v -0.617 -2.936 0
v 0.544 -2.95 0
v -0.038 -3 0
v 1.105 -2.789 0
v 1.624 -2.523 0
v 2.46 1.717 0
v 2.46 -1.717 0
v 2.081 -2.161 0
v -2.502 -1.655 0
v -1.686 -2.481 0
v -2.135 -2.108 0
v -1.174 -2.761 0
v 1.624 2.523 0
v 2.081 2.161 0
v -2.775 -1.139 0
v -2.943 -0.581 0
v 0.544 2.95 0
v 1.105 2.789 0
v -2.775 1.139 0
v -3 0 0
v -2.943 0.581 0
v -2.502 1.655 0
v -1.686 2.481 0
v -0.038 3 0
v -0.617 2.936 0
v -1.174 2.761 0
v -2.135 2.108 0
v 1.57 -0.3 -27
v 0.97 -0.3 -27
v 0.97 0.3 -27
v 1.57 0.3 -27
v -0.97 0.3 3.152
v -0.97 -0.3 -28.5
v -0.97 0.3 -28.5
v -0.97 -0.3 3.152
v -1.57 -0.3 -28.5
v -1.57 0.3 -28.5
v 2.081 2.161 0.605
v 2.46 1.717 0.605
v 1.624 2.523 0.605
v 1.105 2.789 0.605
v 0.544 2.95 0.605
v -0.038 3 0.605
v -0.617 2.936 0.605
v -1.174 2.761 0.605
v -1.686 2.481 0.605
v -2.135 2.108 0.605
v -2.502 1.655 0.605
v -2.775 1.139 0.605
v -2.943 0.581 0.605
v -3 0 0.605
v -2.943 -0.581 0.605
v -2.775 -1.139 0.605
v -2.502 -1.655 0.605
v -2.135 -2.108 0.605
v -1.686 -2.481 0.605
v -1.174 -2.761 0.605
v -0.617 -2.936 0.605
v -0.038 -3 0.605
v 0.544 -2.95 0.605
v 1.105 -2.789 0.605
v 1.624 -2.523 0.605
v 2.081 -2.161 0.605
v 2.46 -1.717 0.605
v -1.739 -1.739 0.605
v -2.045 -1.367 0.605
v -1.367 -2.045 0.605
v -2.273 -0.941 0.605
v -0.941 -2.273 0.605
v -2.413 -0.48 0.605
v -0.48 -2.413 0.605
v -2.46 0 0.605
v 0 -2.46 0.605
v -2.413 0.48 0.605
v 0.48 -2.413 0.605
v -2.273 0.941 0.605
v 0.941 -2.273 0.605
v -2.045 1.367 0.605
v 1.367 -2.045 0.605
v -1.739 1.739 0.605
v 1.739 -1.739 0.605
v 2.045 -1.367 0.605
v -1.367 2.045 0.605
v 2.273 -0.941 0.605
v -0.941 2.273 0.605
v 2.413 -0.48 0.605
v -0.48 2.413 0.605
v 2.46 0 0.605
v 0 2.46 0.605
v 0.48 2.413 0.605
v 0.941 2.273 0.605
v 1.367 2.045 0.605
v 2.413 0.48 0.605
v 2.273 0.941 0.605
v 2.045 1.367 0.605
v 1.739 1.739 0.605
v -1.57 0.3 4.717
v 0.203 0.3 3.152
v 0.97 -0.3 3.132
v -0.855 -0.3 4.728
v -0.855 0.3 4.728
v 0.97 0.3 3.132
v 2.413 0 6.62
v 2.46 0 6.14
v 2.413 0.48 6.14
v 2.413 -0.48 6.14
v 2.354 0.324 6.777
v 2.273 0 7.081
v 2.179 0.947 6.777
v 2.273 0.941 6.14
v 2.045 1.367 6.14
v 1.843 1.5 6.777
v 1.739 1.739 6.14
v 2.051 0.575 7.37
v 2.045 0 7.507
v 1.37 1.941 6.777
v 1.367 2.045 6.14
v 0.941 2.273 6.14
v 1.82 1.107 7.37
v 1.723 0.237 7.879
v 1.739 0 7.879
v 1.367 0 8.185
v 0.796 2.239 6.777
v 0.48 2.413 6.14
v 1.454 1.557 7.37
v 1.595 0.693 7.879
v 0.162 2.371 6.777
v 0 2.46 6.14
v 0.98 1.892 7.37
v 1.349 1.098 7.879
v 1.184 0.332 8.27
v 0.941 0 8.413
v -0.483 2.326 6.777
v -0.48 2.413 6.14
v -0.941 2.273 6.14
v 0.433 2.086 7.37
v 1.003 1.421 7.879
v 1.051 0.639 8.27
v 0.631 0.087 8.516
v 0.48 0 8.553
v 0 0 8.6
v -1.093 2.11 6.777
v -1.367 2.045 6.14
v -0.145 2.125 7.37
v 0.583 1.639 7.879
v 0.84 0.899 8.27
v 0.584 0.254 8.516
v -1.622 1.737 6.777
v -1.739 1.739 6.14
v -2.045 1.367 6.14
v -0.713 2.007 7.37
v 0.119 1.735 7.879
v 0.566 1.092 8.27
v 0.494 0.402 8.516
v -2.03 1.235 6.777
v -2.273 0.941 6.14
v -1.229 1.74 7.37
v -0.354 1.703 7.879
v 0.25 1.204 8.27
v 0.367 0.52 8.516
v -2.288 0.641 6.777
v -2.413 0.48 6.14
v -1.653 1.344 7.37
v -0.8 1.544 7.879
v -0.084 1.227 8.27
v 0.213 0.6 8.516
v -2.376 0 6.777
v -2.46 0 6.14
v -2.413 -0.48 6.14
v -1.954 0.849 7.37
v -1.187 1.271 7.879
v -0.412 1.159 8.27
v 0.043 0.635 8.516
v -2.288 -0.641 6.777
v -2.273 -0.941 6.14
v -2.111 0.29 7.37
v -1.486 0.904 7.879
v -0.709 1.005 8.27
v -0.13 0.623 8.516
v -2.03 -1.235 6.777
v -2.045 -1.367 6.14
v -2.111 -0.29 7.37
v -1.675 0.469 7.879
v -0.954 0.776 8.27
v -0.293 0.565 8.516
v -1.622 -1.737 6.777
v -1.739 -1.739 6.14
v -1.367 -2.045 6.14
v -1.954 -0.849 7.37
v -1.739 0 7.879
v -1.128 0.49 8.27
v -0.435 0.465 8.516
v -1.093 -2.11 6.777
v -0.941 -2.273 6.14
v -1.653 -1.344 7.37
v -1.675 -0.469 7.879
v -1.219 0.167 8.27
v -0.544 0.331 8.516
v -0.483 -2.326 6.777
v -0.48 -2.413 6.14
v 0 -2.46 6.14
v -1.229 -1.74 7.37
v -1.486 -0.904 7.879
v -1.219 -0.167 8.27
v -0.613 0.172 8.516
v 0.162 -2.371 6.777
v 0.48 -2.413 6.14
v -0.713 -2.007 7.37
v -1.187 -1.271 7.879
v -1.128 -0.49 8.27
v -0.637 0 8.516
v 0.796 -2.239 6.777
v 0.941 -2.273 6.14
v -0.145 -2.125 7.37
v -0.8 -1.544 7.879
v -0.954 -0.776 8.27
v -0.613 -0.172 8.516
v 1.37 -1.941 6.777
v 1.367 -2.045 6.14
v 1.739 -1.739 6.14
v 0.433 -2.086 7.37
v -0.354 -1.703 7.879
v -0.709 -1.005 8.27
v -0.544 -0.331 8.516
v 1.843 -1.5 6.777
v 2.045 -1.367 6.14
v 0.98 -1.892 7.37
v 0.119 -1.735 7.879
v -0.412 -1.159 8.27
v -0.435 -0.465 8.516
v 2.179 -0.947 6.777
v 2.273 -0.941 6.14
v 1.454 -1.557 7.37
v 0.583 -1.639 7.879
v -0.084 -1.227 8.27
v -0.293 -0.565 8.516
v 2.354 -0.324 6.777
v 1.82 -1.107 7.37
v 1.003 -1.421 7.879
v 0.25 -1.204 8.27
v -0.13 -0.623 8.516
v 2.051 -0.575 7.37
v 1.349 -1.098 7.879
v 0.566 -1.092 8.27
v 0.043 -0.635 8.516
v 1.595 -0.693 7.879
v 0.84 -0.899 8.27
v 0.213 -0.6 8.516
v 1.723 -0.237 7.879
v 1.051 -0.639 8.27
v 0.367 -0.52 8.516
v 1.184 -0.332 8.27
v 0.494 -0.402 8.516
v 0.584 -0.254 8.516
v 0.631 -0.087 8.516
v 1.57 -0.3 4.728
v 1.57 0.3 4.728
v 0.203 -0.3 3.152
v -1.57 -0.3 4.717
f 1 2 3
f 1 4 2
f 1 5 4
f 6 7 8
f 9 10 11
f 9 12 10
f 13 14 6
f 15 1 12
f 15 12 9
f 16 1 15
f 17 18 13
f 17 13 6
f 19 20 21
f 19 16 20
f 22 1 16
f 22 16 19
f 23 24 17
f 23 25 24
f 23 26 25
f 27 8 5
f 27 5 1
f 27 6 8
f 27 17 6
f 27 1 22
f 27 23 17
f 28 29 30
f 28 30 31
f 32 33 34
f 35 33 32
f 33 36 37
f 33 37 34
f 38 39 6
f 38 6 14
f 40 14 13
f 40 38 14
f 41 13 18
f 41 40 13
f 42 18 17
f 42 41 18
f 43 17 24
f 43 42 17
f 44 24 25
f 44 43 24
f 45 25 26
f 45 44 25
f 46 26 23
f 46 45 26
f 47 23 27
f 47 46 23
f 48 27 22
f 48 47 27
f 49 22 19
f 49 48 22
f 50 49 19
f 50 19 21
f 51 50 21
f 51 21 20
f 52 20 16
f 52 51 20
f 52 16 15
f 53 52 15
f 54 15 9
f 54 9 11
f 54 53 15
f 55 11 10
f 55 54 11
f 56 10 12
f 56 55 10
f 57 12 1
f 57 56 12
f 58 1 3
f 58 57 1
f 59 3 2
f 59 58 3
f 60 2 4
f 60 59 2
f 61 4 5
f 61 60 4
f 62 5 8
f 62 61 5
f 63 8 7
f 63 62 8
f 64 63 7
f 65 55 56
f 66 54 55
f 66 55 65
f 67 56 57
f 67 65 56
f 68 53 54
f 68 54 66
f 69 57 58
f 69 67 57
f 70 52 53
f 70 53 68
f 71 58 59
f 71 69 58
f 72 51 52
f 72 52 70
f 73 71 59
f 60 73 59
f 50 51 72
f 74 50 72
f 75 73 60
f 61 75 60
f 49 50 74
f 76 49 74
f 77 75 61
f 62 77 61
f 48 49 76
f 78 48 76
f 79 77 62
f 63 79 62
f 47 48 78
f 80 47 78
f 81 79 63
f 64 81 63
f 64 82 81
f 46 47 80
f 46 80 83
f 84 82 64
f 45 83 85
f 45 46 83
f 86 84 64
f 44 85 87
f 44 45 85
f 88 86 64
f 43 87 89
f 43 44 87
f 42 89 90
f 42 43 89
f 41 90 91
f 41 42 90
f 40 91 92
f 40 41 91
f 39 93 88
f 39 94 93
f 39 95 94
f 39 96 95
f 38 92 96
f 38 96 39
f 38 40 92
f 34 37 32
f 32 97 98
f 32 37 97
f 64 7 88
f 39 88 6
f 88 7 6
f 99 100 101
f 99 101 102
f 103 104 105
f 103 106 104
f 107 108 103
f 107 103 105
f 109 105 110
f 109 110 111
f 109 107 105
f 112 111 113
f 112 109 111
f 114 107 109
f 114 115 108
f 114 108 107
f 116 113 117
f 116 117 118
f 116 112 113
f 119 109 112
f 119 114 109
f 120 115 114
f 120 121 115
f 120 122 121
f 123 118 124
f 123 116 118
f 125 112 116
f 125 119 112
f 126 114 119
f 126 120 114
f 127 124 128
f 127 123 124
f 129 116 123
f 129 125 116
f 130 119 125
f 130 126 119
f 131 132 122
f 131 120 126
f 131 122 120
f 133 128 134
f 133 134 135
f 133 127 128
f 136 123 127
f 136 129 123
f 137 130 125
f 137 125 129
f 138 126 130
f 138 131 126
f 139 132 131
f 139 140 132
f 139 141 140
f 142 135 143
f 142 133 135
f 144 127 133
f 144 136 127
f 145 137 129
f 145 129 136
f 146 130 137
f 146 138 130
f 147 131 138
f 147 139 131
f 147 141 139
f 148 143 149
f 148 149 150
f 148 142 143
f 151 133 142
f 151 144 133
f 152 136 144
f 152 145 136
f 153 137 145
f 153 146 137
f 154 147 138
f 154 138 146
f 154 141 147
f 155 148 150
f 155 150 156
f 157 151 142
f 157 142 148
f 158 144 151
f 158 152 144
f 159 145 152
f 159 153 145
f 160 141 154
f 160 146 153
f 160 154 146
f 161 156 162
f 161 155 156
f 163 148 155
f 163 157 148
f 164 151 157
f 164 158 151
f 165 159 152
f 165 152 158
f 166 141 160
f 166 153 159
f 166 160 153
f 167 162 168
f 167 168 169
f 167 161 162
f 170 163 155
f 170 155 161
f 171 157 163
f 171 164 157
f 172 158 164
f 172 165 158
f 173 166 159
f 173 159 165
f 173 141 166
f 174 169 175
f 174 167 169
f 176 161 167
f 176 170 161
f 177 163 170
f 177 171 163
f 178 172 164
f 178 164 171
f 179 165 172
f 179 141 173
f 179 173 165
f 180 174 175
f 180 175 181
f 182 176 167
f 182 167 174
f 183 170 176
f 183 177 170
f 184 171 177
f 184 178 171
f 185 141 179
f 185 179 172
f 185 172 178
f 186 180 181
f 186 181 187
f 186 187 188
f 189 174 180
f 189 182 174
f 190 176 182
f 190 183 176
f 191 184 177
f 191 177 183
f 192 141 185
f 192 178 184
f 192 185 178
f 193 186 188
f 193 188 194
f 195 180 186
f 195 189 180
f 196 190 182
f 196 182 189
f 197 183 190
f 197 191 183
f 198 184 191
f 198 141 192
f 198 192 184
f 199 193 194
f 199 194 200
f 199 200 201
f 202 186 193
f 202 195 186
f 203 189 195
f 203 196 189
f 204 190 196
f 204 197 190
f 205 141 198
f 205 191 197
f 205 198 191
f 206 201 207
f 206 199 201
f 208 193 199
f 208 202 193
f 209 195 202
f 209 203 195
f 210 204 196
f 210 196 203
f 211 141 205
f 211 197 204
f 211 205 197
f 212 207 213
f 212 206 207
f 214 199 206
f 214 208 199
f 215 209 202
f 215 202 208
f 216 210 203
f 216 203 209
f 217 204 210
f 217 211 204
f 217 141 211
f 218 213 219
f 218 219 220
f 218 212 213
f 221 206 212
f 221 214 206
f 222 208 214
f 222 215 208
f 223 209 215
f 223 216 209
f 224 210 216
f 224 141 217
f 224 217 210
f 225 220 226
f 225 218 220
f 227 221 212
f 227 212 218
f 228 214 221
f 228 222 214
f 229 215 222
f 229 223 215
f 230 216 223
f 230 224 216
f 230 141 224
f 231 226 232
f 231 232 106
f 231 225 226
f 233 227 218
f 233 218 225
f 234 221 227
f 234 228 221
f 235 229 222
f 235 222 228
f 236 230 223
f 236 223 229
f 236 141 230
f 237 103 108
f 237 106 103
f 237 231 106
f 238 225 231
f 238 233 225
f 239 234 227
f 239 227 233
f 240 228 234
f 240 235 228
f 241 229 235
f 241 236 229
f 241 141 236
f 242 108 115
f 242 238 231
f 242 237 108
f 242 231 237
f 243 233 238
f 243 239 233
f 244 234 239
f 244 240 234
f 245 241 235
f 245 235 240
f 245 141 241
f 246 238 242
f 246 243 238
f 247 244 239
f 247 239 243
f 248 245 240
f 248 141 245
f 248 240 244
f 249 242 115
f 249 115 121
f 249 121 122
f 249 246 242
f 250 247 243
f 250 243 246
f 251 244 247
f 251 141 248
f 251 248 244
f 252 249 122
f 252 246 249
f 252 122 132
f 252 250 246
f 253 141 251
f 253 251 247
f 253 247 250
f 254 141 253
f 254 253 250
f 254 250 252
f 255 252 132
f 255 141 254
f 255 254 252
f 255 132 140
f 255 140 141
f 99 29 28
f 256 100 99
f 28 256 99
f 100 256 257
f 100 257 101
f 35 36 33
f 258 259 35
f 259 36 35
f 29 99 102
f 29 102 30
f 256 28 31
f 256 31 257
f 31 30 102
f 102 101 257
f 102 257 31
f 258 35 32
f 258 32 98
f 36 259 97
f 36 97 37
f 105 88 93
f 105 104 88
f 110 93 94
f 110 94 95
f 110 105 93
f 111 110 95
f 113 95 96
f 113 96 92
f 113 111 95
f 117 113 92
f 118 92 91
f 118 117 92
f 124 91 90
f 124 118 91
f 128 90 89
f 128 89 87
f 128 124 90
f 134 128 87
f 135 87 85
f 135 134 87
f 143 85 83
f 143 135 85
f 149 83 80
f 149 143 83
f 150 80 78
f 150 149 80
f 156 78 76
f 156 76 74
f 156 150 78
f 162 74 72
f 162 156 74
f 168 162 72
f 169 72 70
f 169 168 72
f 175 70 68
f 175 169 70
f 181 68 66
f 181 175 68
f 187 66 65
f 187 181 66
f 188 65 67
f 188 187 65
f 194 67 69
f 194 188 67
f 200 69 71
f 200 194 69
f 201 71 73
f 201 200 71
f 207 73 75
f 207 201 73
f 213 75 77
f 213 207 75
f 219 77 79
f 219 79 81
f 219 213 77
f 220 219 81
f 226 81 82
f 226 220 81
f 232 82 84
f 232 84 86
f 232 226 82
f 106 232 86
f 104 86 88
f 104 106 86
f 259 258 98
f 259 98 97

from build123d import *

# Parameters (mm, degrees)
F3_DEPTH = 25.4
F2_W     = 0.6
F2_H     = 0.6
F4_DEPTH = 27
F5_DEPTH = 28.5
F7_DEPTH = 0.6
F9_DEPTH = 0.6


with BuildPart() as f1:
    # F0 (on Front) → F1 (revolve)
    with BuildSketch(Plane.XZ):
        with BuildLine():
            Line((0, 0.6049648509), (0, 0))
            Line((0, 0), (2.46, 0))
            Line((2.46, 0), (3, 0))
            Line((3, 0), (3, 0.6049648509))
            Line((3, 0.6049648509), (2.46, 0.6049648509))
            Line((2.46, 0.6049648509), (2.46, 6.14))
            ThreePointArc((2.46, 6.14), (1.7394826817, 7.8794826817), (0, 8.6))
            Line((0, 8.6), (0, 0.6049648509))
        make_face()
    revolve(axis=Axis((0, 0, 4.3), (0, 0, 1)))

    # F2 (on face) → F3 (cut)
    with BuildSketch(Plane(origin=(0, 0, 0), x_dir=(1, 0, 0), z_dir=(0, 0, -1))):
        with BuildLine():
            Line((2.46, 1.7170905626), (2.46, 0))
            Line((2.46, 0), (2.46, -1.7170905626))
            ThreePointArc((2.46, -1.7170905626), (2.8618176043, -0.9), (3, 0))
            ThreePointArc((3, 0), (2.8618176043, 0.9), (2.46, 1.7170905626))
        make_face()
    extrude(amount=-F3_DEPTH, mode=Mode.SUBTRACT)


with BuildPart() as f4:
    # F2 (on face) → F4 (new body)
    with BuildSketch(Plane(origin=(0, 0, 0), x_dir=(1, 0, 0), z_dir=(0, 0, -1))):
        with Locations((1.27, 0)):
            Rectangle(F2_W, F2_H)
    extrude(amount=F4_DEPTH)

    # F6 (on face) → F7 (join)
    with BuildSketch(Plane.XZ.offset(0.3)):
        Polygon((0.97, 3.1320848502), (0.97, 0), (1.57, 0), (1.57, 4.7281896695), (-0.8547797916, 4.7281896695), align=None)
    extrude(amount=-F7_DEPTH)


with BuildPart() as f5:
    # F2 (on face) → F5 (new body)
    with BuildSketch(Plane(origin=(0, 0, 0), x_dir=(1, 0, 0), z_dir=(0, 0, -1))):
        with Locations((-1.27, 0)):
            Rectangle(F2_W, F2_H)
    extrude(amount=F5_DEPTH)

    # F8 (on face) → F9 (join)
    with BuildSketch(Plane.XZ.offset(0.3)):
        Polygon((-1.57, 4.7174678184), (-1.57, 0), (-0.97, 0), (-0.97, 3.151535755), (0.2029162715, 3.151535755), align=None)
    extrude(amount=-F9_DEPTH)


solid = Compound([f1.part, f4.part, f5.part])
